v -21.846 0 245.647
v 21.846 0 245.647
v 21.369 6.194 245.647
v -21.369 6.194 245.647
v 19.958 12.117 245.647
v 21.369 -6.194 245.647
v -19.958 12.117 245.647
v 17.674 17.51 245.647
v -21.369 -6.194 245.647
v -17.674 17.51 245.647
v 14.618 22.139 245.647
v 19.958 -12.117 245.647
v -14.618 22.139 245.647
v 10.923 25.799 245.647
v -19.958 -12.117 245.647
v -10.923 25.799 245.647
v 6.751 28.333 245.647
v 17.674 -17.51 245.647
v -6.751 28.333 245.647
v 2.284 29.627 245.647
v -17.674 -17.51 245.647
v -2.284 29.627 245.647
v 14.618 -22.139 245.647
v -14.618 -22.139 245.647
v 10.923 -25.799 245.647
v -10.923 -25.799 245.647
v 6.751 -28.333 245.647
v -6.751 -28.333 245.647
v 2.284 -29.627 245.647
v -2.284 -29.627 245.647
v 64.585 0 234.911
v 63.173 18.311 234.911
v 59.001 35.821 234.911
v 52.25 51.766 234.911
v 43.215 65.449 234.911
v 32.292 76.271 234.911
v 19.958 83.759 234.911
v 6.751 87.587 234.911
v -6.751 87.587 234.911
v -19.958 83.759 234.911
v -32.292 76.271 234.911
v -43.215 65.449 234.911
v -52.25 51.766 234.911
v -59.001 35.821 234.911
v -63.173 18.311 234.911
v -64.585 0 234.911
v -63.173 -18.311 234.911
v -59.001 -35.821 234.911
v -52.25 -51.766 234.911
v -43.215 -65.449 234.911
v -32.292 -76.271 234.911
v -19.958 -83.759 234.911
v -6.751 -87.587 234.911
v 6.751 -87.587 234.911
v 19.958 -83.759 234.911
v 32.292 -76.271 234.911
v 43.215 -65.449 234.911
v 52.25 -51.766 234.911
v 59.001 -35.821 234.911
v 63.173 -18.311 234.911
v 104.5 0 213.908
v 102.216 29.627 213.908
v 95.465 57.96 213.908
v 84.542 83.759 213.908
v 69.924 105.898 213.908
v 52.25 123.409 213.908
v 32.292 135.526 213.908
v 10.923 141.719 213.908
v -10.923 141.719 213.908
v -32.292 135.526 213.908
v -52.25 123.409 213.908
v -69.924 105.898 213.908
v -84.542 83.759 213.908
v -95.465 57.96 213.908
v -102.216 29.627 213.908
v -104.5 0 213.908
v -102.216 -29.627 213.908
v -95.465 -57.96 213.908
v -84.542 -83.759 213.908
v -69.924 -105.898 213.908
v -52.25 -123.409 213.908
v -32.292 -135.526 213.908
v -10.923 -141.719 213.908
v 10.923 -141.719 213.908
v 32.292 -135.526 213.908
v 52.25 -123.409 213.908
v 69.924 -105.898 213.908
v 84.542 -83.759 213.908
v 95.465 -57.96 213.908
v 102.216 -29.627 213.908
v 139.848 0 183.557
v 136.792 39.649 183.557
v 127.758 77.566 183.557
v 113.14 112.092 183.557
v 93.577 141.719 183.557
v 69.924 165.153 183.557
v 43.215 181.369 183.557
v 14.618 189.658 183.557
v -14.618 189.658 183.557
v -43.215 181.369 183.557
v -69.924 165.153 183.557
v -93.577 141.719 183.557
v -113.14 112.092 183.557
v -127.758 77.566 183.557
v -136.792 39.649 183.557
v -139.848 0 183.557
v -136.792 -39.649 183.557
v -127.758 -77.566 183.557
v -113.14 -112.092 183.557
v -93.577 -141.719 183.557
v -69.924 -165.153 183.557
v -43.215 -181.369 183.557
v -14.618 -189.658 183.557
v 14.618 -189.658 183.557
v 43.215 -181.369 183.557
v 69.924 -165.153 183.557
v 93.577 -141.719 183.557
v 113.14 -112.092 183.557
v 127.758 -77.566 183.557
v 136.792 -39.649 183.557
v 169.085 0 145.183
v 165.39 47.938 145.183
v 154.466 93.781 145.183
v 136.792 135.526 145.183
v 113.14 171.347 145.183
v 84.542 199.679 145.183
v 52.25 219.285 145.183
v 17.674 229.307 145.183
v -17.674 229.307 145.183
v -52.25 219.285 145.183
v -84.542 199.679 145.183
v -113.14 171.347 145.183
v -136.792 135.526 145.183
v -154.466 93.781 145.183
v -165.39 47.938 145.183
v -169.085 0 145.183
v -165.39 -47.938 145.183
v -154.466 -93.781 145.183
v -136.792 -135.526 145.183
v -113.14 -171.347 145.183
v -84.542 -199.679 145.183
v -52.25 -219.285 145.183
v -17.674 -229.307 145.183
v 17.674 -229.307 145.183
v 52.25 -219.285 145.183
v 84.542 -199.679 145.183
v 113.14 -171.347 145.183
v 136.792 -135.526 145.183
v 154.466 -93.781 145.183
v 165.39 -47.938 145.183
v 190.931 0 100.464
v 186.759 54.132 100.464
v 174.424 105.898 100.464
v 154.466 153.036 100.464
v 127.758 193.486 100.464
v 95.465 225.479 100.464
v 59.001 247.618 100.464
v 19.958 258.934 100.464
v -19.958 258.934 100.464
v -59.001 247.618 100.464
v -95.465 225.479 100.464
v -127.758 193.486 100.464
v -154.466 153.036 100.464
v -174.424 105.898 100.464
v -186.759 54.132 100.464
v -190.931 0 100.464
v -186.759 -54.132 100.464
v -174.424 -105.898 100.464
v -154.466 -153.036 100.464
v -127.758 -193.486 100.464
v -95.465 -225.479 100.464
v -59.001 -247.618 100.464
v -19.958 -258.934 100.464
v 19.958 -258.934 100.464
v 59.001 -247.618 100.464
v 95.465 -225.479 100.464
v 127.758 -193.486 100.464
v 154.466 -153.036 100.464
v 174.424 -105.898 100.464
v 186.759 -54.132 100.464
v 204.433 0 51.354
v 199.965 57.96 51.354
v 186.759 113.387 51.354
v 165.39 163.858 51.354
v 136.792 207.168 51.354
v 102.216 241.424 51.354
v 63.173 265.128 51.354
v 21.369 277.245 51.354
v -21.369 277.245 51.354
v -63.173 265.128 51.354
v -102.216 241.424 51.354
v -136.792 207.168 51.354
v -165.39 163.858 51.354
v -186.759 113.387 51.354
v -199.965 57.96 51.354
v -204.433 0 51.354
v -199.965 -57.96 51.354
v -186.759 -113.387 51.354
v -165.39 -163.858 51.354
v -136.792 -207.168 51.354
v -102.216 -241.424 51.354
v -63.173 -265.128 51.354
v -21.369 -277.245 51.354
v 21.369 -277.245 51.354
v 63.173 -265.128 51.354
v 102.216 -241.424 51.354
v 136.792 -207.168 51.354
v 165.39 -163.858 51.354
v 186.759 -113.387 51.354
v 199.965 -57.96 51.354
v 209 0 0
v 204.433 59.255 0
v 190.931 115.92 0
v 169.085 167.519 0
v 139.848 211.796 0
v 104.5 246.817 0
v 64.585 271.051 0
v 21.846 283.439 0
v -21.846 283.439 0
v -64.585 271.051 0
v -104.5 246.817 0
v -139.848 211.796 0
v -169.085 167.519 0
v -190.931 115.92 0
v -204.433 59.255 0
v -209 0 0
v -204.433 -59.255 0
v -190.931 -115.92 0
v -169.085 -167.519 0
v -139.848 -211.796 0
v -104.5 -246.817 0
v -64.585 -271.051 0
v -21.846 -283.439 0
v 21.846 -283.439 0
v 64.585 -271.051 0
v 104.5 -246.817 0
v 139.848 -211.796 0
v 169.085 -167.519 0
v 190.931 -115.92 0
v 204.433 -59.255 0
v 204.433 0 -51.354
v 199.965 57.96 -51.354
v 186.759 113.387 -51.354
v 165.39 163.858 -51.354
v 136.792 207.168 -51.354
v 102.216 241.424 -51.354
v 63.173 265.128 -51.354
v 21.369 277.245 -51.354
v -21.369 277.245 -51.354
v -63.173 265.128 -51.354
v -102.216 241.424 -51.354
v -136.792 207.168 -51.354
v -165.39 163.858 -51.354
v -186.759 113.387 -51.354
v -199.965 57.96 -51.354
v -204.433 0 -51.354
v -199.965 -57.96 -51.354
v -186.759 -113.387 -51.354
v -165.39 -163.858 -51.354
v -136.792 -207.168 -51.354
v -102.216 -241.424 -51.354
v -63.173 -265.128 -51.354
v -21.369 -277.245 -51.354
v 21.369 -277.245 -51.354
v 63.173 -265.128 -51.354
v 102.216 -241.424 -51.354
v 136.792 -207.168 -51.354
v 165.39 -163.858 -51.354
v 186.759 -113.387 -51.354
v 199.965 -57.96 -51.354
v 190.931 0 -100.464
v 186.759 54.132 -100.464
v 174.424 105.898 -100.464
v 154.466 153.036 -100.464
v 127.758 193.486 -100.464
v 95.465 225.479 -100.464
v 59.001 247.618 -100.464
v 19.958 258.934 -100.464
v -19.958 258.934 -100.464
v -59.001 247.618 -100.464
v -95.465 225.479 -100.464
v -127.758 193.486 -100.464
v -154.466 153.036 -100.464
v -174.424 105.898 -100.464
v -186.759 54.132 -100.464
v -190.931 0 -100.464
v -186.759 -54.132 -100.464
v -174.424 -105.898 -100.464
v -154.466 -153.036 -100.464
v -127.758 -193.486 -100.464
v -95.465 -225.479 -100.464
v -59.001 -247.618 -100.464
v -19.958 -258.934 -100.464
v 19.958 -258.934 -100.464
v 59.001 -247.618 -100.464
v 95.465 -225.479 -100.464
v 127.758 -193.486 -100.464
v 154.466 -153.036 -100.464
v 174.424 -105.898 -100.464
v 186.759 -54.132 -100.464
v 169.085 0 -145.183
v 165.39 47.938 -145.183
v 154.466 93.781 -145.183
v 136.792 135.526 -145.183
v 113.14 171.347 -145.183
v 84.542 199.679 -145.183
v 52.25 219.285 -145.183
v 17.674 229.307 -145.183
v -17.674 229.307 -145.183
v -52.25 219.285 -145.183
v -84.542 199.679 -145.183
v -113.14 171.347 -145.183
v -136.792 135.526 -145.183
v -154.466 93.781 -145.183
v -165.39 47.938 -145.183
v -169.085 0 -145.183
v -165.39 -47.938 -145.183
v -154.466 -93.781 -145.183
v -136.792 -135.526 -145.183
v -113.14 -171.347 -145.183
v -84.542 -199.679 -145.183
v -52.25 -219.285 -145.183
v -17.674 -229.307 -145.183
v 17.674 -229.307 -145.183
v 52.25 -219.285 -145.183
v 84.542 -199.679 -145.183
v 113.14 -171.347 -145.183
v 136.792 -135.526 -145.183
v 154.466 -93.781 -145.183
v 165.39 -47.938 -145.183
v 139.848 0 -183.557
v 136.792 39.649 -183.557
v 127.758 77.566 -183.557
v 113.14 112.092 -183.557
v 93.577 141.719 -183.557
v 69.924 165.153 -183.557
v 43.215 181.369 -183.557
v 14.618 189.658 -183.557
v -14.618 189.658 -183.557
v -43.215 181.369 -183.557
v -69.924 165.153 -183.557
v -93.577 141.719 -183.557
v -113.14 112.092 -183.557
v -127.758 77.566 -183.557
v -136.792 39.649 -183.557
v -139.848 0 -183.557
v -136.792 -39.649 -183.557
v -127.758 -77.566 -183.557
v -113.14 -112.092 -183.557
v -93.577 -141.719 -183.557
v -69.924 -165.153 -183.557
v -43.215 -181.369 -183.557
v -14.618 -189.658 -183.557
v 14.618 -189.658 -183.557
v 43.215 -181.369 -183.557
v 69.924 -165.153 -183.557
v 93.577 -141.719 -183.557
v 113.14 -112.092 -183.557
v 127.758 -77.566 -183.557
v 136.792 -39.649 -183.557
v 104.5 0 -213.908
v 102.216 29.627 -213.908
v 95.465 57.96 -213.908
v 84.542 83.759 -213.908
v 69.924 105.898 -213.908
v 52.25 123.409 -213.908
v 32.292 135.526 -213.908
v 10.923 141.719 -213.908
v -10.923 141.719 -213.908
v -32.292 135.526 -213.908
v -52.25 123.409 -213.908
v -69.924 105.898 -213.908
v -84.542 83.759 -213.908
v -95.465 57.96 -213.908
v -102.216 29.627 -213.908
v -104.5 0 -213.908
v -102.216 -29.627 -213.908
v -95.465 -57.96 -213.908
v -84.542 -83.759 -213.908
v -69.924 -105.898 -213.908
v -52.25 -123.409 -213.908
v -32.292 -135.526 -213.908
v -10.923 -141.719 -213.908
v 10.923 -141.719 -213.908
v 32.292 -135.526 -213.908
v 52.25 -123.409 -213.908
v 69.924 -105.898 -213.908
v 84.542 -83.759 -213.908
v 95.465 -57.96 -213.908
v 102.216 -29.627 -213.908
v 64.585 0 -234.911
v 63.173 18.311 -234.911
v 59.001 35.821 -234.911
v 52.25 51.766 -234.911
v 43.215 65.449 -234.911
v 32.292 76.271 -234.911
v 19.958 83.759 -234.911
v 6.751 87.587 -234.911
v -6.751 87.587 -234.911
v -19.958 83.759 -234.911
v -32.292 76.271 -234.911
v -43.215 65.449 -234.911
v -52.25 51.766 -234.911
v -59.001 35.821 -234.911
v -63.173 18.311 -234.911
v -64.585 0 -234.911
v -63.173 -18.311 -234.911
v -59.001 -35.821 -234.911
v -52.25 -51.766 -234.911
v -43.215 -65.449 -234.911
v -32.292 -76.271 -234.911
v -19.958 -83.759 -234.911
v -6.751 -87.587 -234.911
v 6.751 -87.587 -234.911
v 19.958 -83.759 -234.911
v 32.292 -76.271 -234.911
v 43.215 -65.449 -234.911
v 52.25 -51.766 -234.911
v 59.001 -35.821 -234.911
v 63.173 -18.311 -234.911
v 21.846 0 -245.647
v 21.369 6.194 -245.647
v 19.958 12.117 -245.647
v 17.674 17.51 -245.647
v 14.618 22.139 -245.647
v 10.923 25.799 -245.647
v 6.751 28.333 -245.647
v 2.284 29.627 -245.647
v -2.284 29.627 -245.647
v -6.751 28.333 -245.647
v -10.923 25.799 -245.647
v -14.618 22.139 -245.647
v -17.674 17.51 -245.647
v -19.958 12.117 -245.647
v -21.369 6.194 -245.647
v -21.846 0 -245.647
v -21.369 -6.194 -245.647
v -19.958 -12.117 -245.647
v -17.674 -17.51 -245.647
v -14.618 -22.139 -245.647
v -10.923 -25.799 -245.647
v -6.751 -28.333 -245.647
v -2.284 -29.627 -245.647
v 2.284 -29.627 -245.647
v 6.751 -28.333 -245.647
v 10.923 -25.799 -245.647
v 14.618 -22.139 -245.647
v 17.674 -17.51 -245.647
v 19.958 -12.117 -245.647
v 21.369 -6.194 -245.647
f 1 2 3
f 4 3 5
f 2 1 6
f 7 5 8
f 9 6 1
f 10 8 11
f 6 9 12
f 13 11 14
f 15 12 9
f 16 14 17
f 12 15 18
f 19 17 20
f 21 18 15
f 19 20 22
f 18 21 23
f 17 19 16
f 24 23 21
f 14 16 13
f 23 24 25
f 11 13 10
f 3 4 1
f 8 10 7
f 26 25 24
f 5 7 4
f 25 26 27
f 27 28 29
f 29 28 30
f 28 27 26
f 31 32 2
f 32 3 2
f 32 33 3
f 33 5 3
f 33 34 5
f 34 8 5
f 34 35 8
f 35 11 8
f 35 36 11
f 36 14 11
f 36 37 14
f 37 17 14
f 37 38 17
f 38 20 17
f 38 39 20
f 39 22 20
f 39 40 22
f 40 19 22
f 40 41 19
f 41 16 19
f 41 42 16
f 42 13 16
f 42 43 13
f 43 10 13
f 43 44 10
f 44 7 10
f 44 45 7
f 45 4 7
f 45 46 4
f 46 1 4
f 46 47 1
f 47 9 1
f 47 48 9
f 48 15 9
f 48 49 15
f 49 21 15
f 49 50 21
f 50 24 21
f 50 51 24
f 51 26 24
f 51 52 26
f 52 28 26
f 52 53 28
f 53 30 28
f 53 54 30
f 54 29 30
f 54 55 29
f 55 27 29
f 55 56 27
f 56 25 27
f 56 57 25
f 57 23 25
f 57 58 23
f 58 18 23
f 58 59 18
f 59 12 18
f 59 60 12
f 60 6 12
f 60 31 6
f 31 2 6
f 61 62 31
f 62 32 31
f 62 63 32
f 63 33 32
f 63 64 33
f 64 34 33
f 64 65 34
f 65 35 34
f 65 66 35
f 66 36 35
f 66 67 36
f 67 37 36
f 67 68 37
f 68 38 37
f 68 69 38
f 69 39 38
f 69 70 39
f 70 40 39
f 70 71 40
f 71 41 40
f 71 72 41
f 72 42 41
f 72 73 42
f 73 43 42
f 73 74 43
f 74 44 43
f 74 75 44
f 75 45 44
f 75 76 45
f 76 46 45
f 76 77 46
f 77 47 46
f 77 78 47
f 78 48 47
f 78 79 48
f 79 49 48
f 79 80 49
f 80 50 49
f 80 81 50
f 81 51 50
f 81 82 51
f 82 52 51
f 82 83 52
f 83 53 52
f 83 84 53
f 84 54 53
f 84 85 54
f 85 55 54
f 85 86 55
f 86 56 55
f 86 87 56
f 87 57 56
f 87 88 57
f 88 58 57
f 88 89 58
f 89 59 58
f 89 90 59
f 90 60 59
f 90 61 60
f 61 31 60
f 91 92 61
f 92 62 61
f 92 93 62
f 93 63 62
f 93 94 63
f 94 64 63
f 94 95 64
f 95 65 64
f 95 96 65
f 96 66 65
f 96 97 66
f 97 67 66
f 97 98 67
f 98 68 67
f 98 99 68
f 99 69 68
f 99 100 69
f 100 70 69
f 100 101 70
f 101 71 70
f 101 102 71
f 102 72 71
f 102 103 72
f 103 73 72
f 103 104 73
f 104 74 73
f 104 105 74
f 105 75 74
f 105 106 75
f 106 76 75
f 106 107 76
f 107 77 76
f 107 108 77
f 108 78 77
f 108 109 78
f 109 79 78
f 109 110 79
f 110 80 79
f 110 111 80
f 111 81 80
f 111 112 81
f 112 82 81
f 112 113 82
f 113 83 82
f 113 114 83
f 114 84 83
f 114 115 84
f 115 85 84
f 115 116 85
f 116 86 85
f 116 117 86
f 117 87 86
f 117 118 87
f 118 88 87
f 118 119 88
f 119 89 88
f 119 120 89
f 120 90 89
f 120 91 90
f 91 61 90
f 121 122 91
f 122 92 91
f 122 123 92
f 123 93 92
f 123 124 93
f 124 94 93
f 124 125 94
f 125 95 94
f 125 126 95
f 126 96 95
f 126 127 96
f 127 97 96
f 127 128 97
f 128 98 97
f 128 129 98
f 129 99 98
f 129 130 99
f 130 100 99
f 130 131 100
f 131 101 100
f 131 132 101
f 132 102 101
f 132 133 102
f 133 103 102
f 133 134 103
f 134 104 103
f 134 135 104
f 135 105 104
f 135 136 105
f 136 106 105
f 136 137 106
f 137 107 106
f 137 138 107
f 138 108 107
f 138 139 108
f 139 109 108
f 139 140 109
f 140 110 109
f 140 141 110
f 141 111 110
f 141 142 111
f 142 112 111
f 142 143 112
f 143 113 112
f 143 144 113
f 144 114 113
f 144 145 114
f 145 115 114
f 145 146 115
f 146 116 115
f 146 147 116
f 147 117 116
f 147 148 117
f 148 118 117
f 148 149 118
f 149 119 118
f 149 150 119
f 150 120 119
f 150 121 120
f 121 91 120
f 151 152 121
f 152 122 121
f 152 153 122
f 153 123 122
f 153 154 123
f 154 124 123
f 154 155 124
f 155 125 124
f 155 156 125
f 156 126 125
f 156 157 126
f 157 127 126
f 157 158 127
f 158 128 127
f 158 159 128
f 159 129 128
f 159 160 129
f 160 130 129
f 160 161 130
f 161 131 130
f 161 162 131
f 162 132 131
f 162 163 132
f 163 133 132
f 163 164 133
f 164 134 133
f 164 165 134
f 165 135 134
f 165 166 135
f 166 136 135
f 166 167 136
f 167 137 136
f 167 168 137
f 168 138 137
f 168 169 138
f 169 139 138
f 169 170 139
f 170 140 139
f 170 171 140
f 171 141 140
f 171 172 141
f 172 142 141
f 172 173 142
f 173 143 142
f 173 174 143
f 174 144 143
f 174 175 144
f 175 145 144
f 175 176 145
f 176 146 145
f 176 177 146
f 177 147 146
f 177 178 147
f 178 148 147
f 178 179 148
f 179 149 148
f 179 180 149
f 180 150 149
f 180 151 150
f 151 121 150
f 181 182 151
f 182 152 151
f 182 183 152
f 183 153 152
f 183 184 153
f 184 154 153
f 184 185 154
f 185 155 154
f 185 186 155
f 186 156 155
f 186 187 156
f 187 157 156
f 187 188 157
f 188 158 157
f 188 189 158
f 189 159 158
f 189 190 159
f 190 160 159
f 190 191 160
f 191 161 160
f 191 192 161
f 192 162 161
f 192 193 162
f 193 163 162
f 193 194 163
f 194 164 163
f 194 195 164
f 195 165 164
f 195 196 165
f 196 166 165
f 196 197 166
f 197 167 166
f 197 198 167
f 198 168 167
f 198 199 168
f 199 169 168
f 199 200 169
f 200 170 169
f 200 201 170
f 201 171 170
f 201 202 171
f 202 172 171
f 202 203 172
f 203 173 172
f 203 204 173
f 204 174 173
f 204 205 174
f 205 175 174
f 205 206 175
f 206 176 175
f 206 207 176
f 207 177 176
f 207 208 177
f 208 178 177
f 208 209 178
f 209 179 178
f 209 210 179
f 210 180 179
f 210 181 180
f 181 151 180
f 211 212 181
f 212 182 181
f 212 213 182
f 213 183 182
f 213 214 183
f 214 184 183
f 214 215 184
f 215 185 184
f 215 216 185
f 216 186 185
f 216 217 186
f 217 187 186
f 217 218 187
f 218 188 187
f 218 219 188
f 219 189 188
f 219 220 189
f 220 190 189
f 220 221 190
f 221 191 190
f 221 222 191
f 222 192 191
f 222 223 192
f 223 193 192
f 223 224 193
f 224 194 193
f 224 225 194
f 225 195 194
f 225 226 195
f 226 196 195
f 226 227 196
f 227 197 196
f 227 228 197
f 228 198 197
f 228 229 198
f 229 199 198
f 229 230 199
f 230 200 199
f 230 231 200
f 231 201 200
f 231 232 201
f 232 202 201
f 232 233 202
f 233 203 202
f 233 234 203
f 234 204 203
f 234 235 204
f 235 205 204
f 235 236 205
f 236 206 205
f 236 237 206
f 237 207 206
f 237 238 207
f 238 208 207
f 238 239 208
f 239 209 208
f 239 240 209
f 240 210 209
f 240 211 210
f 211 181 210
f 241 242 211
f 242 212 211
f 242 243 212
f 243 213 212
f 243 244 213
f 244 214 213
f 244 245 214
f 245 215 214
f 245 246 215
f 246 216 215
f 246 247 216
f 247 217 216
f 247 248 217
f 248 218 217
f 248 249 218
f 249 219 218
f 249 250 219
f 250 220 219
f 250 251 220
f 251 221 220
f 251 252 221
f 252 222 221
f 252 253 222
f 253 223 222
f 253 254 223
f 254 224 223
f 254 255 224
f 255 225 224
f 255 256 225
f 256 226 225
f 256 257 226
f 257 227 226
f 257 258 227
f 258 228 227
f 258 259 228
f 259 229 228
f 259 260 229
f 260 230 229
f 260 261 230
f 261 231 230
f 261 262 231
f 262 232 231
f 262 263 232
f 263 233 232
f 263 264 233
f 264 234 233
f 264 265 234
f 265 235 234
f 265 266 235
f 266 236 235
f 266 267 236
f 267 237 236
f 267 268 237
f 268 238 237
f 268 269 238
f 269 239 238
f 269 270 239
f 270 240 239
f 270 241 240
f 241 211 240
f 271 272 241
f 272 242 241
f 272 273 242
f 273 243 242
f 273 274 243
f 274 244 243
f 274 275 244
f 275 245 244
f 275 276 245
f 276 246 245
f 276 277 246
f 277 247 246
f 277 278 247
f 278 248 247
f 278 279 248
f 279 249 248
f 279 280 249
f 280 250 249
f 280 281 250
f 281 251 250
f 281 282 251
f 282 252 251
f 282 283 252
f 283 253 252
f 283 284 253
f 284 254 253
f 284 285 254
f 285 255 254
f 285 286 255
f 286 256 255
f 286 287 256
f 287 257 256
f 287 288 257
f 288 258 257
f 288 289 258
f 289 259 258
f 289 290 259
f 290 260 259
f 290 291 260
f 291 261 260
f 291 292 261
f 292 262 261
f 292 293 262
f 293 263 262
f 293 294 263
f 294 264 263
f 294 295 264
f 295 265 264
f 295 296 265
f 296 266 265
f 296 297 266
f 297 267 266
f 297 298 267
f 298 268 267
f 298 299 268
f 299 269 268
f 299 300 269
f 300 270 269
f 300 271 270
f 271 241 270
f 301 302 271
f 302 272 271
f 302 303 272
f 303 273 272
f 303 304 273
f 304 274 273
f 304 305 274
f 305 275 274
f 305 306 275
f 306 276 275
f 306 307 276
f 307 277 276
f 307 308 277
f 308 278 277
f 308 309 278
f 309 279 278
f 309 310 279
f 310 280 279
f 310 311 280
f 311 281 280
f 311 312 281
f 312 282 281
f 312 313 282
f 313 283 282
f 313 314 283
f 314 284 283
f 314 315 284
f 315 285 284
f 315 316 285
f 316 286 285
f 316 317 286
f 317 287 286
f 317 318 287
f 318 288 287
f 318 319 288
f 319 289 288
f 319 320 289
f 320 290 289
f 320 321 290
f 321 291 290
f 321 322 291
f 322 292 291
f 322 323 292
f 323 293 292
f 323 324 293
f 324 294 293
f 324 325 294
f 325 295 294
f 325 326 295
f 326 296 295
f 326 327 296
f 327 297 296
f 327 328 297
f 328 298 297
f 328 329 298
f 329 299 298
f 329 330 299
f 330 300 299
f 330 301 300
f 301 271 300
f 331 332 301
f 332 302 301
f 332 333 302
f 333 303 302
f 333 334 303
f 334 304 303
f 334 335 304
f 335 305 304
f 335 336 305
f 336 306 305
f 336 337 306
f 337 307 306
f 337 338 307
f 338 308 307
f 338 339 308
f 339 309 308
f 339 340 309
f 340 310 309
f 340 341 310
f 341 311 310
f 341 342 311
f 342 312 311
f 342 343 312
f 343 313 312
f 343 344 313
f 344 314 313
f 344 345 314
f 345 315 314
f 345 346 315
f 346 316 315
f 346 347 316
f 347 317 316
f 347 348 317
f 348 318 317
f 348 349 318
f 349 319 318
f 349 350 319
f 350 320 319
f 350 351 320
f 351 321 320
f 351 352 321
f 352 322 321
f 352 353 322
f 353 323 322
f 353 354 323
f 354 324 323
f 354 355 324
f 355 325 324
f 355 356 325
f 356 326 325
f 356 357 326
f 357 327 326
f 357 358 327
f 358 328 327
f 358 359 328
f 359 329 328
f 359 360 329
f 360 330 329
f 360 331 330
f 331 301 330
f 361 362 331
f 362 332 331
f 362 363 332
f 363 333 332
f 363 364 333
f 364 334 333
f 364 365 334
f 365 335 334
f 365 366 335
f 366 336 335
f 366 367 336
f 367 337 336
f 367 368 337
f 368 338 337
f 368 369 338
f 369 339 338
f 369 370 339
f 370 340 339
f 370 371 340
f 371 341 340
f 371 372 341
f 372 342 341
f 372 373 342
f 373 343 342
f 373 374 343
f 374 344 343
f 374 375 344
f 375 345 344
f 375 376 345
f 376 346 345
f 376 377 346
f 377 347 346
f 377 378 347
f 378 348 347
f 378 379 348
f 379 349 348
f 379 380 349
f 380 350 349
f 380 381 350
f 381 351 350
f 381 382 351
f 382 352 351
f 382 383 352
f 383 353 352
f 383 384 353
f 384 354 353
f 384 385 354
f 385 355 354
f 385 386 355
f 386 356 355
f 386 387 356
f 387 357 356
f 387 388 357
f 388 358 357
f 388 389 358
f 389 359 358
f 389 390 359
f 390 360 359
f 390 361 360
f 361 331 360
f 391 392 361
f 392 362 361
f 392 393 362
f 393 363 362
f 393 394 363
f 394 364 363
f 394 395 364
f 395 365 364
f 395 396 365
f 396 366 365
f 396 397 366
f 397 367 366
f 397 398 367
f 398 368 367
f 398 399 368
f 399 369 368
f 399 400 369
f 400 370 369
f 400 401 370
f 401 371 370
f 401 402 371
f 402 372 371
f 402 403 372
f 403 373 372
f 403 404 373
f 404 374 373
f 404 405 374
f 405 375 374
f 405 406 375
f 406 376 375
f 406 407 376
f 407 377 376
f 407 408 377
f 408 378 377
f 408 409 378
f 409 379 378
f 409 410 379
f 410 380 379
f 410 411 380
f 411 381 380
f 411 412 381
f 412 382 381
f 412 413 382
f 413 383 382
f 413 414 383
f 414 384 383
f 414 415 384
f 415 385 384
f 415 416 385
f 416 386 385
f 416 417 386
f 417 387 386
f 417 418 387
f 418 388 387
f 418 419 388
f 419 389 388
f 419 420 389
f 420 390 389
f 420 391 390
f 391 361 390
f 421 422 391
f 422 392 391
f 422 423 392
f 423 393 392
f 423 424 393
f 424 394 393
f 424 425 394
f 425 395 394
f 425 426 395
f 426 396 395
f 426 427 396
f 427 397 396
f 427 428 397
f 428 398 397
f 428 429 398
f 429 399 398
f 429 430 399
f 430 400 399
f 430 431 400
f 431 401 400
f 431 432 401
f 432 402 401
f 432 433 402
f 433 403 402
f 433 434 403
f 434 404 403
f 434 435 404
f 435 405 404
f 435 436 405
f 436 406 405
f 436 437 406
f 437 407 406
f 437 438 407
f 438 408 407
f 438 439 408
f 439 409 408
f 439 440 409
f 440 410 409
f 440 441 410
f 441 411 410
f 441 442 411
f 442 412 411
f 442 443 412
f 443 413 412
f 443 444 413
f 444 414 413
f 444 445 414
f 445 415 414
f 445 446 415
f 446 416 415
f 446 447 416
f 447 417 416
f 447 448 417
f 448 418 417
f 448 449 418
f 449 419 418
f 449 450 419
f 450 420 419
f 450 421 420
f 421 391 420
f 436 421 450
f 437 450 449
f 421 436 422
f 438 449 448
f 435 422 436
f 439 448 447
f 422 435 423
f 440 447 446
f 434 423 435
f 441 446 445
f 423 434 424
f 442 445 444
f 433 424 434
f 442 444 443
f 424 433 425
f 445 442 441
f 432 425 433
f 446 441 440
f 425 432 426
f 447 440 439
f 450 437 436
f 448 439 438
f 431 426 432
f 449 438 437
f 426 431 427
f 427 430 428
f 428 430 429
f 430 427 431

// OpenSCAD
// Generated by SolidPython 1.0.1 on 2020-07-29 00:46:50


scale(v = [11, 15, 13]) {
	sphere(r = 19);
}
/***********************************************
*********      SolidPython code:      **********
************************************************
 
# import packages: SolidPython
from solid import *
from solid.utils import *
from itertools import chain, combinations, permutations


class Resize:

    def __init__(self, scad_file):
        self.scad_file = scad_file
        #self.scad_file = import_scad(scad_file)
        # cone/cylinder param:
        self.r1 = 0
        self.r2 = 0
        self.h = 0
        # rectangular prism param:
        self.w = 0
        self.l = 0
        # ellipse param:
        self.r = 0

    # import OpenScad code (file name corresponds to shape)


    # classify shape + parameters
    def assign(self, param1, param2, param3):
        if self.scad_file == 'cone.scad':
            self.r1 = param1
            self.r2 = param2
            self.h = param3
        elif self.scad_file == 'cylinder.scad':
            self.r1 = param1
            self.r2 = param2
            self.h = param3
        elif self.scad_file == 'rectangularPrism.scad':
            self.h = param1
            self.l = param2
            self.w = param3
        else:
            self.r = param1
            self.h = param2

    # resize parameters
    def iterate(self):
        x = range(3, 20, 2)
        i = 1
        if self.scad_file == 'cone.scad':
            tempList = list(permutations(x, 2))
            for temp in tempList:
                param1 = temp[0]
                param2 = temp[1]
                filepath = 'produced_scad_files/' + 'cone' + str(param1) + '_' + str(param2) + '_' + '.scad'
                scad_render_to_file(cylinder(h=param1, r1=param2, r2=0), filepath)

        elif self.scad_file == 'cylinder.scad':
            tempList = list(permutations(x, 3))
            for temp in tempList:
                param1 = temp[0]
                param2 = temp[1]
                filepath = 'produced_scad_files/' + 'cylinder' + str(param1) + '_' + str(param2) + '_' + '.scad'
                scad_render_to_file(cylinder(h=param1, r1=param2, r2=param2), filepath)

        elif self.scad_file == 'rectangularPrism.scad':
            tempList = list(permutations(x, 3))
            for temp in tempList:
                param1 = temp[0]
                param2 = temp[1]
                param3 = temp[2]
                filepath = 'produced_scad_files/' + 'rectangularPrism' + str(param1) + '_' + str(param2) + '_' + str(
                    param3) + '.scad'
                scad_render_to_file(cube(size=(param1, param2, param3)), filepath)

        elif self.scad_file == 'ellipse.scad':
            tempList = list(permutations(x, 4))
            for temp in tempList:
                param1 = temp[0]
                param2 = temp[1]
                param3 = temp[2]
                param4 = temp[3]
                filepath = 'produced_scad_files/' + 'ellipse' + str(param1) + '_' + str(param2) + '_' + str(param3) + '_' + str(param4) + '.scad'
                scad_render_to_file(scale([param1, param2, param3])(sphere(r=param4)), filepath)

    def render_to_scadfile(self):
        scad_render_to_file(scad, 'example.scad') 
 
************************************************/
